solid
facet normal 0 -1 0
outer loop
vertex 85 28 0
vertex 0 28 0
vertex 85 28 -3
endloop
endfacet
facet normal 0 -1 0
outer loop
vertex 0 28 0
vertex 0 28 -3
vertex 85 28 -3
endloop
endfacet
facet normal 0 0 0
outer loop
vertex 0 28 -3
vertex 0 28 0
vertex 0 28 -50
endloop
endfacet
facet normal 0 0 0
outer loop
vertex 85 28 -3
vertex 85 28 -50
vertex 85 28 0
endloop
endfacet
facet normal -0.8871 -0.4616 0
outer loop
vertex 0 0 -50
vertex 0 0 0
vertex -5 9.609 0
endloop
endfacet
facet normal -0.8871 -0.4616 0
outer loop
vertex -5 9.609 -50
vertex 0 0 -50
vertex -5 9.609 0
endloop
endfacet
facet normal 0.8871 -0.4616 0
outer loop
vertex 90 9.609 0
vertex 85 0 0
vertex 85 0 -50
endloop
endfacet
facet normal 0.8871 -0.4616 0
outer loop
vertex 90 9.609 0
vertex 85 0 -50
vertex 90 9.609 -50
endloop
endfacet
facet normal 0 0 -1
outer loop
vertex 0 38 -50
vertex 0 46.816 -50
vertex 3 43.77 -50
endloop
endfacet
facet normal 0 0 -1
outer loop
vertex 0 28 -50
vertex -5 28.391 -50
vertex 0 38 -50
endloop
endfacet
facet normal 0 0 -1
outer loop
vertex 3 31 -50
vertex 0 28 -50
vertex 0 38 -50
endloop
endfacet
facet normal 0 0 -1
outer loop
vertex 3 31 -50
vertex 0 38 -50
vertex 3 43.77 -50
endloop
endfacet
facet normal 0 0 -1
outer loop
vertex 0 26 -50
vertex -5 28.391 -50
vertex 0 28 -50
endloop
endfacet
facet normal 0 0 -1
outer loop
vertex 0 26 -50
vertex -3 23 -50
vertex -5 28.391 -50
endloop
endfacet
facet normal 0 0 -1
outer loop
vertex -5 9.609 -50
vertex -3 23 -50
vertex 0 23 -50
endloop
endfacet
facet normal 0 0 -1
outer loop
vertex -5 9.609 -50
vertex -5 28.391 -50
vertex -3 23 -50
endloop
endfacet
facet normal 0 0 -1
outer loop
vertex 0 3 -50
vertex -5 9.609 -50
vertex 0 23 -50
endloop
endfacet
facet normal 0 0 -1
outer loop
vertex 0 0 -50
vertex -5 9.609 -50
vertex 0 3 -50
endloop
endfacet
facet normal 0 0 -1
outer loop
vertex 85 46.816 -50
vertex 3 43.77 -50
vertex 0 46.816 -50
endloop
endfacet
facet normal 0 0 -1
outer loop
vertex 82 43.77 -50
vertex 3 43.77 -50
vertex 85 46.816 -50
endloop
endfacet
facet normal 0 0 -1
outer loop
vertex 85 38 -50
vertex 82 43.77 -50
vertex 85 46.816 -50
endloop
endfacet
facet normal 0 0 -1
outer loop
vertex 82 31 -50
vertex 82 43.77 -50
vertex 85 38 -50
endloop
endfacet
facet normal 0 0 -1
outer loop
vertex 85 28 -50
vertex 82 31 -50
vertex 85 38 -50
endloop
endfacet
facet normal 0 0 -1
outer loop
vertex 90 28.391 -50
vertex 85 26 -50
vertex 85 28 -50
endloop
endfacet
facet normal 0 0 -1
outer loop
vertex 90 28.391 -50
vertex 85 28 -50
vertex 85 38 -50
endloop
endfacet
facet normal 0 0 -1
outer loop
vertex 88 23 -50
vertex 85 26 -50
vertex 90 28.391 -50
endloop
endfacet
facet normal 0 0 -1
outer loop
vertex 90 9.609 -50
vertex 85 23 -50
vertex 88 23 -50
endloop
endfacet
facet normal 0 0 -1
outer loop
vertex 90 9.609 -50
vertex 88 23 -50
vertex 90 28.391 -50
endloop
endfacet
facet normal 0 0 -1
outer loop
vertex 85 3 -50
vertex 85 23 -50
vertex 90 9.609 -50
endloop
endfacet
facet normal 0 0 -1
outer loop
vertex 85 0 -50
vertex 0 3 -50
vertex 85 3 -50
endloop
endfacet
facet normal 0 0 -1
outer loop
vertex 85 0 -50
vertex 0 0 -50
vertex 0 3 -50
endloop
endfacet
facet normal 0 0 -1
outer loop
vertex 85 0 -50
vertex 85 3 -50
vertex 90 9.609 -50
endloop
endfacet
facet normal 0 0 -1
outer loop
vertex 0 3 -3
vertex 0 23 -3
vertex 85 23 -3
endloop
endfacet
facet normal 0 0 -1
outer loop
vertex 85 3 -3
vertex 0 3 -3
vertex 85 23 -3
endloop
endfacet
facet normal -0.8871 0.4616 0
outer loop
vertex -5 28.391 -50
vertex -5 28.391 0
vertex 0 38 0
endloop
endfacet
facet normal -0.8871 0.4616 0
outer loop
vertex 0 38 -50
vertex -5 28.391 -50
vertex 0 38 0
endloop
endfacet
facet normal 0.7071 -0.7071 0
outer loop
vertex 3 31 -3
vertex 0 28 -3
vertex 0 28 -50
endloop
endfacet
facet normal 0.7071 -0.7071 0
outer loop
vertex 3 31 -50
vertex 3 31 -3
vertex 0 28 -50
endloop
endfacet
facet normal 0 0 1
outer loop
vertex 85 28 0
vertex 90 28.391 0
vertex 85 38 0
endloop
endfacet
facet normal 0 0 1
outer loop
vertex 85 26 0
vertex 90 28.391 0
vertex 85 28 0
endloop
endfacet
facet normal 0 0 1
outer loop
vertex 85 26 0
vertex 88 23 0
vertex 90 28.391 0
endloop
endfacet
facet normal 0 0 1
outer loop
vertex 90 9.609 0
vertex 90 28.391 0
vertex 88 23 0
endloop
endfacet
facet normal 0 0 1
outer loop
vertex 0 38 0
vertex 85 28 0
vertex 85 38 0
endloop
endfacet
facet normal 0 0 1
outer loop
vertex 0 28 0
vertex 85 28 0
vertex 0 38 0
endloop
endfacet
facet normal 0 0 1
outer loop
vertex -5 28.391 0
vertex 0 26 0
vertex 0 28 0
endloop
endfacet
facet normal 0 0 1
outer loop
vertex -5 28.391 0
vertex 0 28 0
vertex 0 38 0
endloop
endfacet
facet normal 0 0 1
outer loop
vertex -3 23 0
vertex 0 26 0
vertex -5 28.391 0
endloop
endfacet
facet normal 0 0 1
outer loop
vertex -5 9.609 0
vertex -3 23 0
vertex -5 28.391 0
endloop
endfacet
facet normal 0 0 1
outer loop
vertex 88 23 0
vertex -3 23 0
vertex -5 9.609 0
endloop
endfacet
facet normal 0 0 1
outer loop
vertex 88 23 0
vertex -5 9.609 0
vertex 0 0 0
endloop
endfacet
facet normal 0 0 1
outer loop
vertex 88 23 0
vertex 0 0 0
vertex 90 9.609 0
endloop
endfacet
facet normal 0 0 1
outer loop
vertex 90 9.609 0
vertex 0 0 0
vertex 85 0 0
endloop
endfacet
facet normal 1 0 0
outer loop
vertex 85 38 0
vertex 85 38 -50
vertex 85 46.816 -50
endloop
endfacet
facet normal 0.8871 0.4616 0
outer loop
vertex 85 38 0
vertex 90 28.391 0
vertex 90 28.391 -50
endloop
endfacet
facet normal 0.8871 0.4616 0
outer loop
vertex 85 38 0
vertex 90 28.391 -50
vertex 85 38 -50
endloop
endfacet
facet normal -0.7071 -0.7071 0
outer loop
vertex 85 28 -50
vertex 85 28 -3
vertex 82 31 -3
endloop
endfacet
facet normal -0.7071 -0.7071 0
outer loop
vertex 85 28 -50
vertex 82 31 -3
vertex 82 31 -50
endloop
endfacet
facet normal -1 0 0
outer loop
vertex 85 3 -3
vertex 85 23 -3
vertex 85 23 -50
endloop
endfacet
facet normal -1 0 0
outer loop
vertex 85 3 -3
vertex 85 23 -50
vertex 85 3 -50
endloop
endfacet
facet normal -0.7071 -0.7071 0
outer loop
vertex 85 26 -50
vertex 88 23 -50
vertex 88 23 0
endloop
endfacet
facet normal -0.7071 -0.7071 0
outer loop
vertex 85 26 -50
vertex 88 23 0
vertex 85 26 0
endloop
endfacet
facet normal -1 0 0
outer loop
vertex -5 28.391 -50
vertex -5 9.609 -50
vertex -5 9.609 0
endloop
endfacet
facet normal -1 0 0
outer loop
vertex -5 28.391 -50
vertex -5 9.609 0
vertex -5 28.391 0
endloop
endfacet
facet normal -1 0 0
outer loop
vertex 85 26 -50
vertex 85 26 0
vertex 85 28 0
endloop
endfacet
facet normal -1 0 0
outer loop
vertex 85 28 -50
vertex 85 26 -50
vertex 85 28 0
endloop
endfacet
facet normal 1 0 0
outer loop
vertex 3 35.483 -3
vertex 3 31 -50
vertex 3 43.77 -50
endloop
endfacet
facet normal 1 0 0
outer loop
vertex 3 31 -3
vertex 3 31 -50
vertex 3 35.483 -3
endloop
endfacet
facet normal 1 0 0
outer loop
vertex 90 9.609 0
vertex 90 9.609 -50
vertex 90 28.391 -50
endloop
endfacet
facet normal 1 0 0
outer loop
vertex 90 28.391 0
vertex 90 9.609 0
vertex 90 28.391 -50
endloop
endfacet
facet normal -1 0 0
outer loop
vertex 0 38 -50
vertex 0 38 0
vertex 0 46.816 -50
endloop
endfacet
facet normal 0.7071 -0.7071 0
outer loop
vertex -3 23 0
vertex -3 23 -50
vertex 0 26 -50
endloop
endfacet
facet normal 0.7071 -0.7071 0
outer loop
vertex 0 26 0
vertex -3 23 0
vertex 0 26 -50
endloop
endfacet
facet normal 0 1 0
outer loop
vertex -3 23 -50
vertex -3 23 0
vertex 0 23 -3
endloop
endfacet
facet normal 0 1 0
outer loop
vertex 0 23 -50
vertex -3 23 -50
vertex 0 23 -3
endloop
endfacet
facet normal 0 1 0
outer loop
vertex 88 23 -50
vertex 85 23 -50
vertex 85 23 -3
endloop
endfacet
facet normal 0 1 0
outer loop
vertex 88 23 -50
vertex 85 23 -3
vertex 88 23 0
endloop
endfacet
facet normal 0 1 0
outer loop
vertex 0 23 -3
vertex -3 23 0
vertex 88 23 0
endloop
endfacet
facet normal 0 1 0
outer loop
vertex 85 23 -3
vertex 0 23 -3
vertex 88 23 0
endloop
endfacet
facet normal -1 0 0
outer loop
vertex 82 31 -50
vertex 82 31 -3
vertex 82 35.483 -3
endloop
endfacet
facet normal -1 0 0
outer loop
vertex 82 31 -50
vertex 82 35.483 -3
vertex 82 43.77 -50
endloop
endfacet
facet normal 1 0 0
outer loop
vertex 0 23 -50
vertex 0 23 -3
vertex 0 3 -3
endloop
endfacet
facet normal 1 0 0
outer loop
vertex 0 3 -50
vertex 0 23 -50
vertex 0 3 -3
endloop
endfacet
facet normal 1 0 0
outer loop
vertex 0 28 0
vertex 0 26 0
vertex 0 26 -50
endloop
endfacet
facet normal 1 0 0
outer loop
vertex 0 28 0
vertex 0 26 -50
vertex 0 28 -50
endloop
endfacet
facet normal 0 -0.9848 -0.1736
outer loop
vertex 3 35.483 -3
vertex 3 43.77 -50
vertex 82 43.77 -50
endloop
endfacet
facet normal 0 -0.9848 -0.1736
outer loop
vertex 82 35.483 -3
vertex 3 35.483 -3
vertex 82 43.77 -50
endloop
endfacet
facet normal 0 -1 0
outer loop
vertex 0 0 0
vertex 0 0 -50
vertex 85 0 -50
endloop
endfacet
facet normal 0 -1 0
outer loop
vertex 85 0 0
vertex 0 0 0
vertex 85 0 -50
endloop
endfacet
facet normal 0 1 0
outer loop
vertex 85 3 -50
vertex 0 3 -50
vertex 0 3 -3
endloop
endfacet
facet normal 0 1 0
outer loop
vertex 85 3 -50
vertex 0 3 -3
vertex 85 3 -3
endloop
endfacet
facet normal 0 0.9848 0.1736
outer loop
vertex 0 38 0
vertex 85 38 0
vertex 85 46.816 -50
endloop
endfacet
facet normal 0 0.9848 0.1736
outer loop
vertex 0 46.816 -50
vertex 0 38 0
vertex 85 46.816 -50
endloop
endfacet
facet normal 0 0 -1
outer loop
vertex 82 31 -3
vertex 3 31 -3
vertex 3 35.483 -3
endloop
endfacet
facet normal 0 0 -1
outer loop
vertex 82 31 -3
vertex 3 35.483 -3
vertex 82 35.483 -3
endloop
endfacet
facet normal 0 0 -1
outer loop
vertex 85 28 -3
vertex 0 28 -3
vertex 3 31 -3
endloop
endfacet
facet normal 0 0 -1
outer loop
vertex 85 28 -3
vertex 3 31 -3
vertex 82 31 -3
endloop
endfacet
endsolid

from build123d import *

# Parameters (mm, degrees)
SKETCH1_W                      = 85
SKETCH1_H                      = 90
BOSS_EXTRUDE1_BASE_DEPTH       = 3
BOSS_EXTRUDE4_SIDE_WALLS_DEPTH = 90
CUT_EXTRUDE2_GUIDE_HOLES_DEPTH = 133.830719339
SKETCH15_W                     = 85
SKETCH15_H                     = 20
BOSS_EXTRUDE9_REAR_WALL_DEPTH  = 3
BOSS_EXTRUDE1_START            = 3
SKETCH17_W                     = 85
SKETCH17_H                     = 3
BOSS_EXTRUDE1_REAR_WALL_DEPTH  = 12
SKETCH30_W                     = 85
SKETCH30_H                     = 2
CUT_EXTRUDE1_REAR_WALL_DEPTH   = 10
BOSS_EXTRUDE2_START            = 25
SKETCH20_W                     = 3
SKETCH20_H                     = 87
BOSS_EXTRUDE2_SIDE_WALL_DEPTH  = 10
CHAMFER1_SIDE_WALL_SIZE        = 3
BOSS_EXTRUDE5_SIDE_WALL_DEPTH  = 30
CHAMFER2_ROOF_SIZE             = 30
CHAMFER2_ROOF_SIZE_2           = 170.138454589
SKETCH28_W                     = 85
SKETCH28_H                     = 91.38839507
BOSS_EXTRUDE7_ROOF_DEPTH       = 3
SKETCH29_W                     = 8.082998623
SKETCH29_H                     = 55.59785115
CUT_EXTRUDE1_CLEAN_UP_DEPTH    = 142.848358117
SKETCH31_W                     = 95
SKETCH31_H                     = 40
CUT_EXTRUDE2_CLEAN_UP_DEPTH    = 139.209678755


# Some blends are built 0.0001 mm under size
with BuildPart() as part:
    # Sketch1 → Boss-Extrude1 (Base) (new body)
    with BuildSketch(Plane(origin=(0, 0, 0), x_dir=(1, 0, 0), z_dir=(0, 1, 0))):
        with Locations((42.5, 45)):
            Rectangle(SKETCH1_W, SKETCH1_H)
    extrude(amount=BOSS_EXTRUDE1_BASE_DEPTH)

    # Sketch5 → Boss-Extrude4 (Side Walls) (add, through all)
    with BuildSketch(Plane.XY):
        Polygon((-5, 28.390936655), (0, 38), (0, 0), (-5, 9.609063345), align=None)
        Polygon((90, 9.609063345), (90, 28.390936655), (85, 38), (85, 0), align=None)
    extrude(amount=-BOSS_EXTRUDE4_SIDE_WALLS_DEPTH)

    # Sketch4 → Cut-Extrude2 (Guide Holes) (cut, through all)
    with BuildSketch(Plane.XY):
        Polygon((-3, 23), (0, 26), (0, 23), align=None)
        Polygon((85, 23), (88, 23), (85, 26), align=None)
    extrude(amount=-CUT_EXTRUDE2_GUIDE_HOLES_DEPTH, mode=Mode.SUBTRACT)

    # Sketch15 → Boss-Extrude9 (Rear Wall) (add)
    with BuildSketch(Plane.XY):
        with Locations((42.5, 13)):
            Rectangle(SKETCH15_W, SKETCH15_H)
    extrude(amount=-BOSS_EXTRUDE9_REAR_WALL_DEPTH)

    # Sketch17 → Boss-Extrude1 (Rear Wall) (add)
    with BuildSketch(Plane(origin=(0, 23, 0), x_dir=(1, 0, 0), z_dir=(0, 1, 0)).offset(BOSS_EXTRUDE1_START)):
        with Locations((42.5, 1.5)):
            Rectangle(SKETCH17_W, SKETCH17_H)
    extrude(amount=BOSS_EXTRUDE1_REAR_WALL_DEPTH)

    # Sketch30 → Cut-Extrude1 (Rear Wall) (cut)
    with BuildSketch(Plane.XY):
        with Locations((42.5, 27)):
            Rectangle(SKETCH30_W, SKETCH30_H)
    extrude(amount=-CUT_EXTRUDE1_REAR_WALL_DEPTH, mode=Mode.SUBTRACT)

    # Sketch20 → Boss-Extrude2 (Side Wall) (add)
    with BuildSketch(Plane(origin=(0, 3, 0), x_dir=(1, 0, 0), z_dir=(0, 1, 0)).offset(BOSS_EXTRUDE2_START)):
        with Locations((1.5, 46.5)):
            Rectangle(SKETCH20_W, SKETCH20_H)
        with Locations((83.5, 46.5)):
            Rectangle(SKETCH20_W, SKETCH20_H)
    extrude(amount=BOSS_EXTRUDE2_SIDE_WALL_DEPTH)

    # Chamfer1 (Side Wall)
    chamfer1_side_wall_edges = [part.edges().sort_by_distance(p)[0] for p in [
        (82, 28, -46.5),
        (3, 28, -46.5),
    ]]
    chamfer(chamfer1_side_wall_edges, length=CHAMFER1_SIDE_WALL_SIZE - 0.0001)  # a hair under: the kernel refuses the full size

    # Sketch26 → Boss-Extrude5 (Side Wall) (add)
    with BuildSketch(Plane(origin=(0, 38, 0), x_dir=(1, 0, 0), z_dir=(0, 1, 0))):
        Polygon((0, 0), (0, 90), (3, 90), (3, 3), (82, 3), (82, 90), (85, 90), (85, 0), align=None)
    extrude(amount=BOSS_EXTRUDE5_SIDE_WALL_DEPTH)

    # Chamfer2 (Roof)
    # the kernel refuses this chamfer: 170.138454589, 30 mm, written as the material it takes off along each edge
    with BuildSketch(Plane(origin=(527.111375011, 68, 0), x_dir=(0, -0.9776715712462578, 0.21013876076743532), z_dir=(-1, 0, 0))) as chamfer2_roof_piece_1:
        Polygon((CHAMFER2_ROOF_SIZE * 0.977671571246, -CHAMFER2_ROOF_SIZE * 0.210138760767), (-CHAMFER2_ROOF_SIZE_2 * 0.210138760767, -CHAMFER2_ROOF_SIZE_2 * 0.977671571244), (0, 0), align=None)
    extrude(amount=969.222750023, mode=Mode.SUBTRACT)

    # Sketch28 → Boss-Extrude7 (Roof) (add)
    with BuildSketch(Plane(origin=(0, 36.854159795, 6.498382723), x_dir=(1, 0, 0), z_dir=(0, 0.9848077530122086, 0.17364817766692742))):
        with Locations((42.5, 52.292828286)):
            Rectangle(SKETCH28_W, SKETCH28_H)
    extrude(amount=-BOSS_EXTRUDE7_ROOF_DEPTH)

    # Sketch29 → Cut-Extrude1 (Clean up) (cut, through all)
    with BuildSketch(Plane(origin=(90, 0, 0), x_dir=(0, 0, -1), z_dir=(1, 0, 0))):
        with Locations((94.041499312, 27.798925575)):
            Rectangle(SKETCH29_W, SKETCH29_H)
    extrude(amount=-CUT_EXTRUDE1_CLEAN_UP_DEPTH, mode=Mode.SUBTRACT)

    # Sketch31 → Cut-Extrude2 (Clean Up) (cut, through all)
    with BuildSketch(Plane.XZ):
        with Locations((42.5, -70)):
            Rectangle(SKETCH31_W, SKETCH31_H)
    extrude(amount=-CUT_EXTRUDE2_CLEAN_UP_DEPTH, mode=Mode.SUBTRACT)


solid = part.part
